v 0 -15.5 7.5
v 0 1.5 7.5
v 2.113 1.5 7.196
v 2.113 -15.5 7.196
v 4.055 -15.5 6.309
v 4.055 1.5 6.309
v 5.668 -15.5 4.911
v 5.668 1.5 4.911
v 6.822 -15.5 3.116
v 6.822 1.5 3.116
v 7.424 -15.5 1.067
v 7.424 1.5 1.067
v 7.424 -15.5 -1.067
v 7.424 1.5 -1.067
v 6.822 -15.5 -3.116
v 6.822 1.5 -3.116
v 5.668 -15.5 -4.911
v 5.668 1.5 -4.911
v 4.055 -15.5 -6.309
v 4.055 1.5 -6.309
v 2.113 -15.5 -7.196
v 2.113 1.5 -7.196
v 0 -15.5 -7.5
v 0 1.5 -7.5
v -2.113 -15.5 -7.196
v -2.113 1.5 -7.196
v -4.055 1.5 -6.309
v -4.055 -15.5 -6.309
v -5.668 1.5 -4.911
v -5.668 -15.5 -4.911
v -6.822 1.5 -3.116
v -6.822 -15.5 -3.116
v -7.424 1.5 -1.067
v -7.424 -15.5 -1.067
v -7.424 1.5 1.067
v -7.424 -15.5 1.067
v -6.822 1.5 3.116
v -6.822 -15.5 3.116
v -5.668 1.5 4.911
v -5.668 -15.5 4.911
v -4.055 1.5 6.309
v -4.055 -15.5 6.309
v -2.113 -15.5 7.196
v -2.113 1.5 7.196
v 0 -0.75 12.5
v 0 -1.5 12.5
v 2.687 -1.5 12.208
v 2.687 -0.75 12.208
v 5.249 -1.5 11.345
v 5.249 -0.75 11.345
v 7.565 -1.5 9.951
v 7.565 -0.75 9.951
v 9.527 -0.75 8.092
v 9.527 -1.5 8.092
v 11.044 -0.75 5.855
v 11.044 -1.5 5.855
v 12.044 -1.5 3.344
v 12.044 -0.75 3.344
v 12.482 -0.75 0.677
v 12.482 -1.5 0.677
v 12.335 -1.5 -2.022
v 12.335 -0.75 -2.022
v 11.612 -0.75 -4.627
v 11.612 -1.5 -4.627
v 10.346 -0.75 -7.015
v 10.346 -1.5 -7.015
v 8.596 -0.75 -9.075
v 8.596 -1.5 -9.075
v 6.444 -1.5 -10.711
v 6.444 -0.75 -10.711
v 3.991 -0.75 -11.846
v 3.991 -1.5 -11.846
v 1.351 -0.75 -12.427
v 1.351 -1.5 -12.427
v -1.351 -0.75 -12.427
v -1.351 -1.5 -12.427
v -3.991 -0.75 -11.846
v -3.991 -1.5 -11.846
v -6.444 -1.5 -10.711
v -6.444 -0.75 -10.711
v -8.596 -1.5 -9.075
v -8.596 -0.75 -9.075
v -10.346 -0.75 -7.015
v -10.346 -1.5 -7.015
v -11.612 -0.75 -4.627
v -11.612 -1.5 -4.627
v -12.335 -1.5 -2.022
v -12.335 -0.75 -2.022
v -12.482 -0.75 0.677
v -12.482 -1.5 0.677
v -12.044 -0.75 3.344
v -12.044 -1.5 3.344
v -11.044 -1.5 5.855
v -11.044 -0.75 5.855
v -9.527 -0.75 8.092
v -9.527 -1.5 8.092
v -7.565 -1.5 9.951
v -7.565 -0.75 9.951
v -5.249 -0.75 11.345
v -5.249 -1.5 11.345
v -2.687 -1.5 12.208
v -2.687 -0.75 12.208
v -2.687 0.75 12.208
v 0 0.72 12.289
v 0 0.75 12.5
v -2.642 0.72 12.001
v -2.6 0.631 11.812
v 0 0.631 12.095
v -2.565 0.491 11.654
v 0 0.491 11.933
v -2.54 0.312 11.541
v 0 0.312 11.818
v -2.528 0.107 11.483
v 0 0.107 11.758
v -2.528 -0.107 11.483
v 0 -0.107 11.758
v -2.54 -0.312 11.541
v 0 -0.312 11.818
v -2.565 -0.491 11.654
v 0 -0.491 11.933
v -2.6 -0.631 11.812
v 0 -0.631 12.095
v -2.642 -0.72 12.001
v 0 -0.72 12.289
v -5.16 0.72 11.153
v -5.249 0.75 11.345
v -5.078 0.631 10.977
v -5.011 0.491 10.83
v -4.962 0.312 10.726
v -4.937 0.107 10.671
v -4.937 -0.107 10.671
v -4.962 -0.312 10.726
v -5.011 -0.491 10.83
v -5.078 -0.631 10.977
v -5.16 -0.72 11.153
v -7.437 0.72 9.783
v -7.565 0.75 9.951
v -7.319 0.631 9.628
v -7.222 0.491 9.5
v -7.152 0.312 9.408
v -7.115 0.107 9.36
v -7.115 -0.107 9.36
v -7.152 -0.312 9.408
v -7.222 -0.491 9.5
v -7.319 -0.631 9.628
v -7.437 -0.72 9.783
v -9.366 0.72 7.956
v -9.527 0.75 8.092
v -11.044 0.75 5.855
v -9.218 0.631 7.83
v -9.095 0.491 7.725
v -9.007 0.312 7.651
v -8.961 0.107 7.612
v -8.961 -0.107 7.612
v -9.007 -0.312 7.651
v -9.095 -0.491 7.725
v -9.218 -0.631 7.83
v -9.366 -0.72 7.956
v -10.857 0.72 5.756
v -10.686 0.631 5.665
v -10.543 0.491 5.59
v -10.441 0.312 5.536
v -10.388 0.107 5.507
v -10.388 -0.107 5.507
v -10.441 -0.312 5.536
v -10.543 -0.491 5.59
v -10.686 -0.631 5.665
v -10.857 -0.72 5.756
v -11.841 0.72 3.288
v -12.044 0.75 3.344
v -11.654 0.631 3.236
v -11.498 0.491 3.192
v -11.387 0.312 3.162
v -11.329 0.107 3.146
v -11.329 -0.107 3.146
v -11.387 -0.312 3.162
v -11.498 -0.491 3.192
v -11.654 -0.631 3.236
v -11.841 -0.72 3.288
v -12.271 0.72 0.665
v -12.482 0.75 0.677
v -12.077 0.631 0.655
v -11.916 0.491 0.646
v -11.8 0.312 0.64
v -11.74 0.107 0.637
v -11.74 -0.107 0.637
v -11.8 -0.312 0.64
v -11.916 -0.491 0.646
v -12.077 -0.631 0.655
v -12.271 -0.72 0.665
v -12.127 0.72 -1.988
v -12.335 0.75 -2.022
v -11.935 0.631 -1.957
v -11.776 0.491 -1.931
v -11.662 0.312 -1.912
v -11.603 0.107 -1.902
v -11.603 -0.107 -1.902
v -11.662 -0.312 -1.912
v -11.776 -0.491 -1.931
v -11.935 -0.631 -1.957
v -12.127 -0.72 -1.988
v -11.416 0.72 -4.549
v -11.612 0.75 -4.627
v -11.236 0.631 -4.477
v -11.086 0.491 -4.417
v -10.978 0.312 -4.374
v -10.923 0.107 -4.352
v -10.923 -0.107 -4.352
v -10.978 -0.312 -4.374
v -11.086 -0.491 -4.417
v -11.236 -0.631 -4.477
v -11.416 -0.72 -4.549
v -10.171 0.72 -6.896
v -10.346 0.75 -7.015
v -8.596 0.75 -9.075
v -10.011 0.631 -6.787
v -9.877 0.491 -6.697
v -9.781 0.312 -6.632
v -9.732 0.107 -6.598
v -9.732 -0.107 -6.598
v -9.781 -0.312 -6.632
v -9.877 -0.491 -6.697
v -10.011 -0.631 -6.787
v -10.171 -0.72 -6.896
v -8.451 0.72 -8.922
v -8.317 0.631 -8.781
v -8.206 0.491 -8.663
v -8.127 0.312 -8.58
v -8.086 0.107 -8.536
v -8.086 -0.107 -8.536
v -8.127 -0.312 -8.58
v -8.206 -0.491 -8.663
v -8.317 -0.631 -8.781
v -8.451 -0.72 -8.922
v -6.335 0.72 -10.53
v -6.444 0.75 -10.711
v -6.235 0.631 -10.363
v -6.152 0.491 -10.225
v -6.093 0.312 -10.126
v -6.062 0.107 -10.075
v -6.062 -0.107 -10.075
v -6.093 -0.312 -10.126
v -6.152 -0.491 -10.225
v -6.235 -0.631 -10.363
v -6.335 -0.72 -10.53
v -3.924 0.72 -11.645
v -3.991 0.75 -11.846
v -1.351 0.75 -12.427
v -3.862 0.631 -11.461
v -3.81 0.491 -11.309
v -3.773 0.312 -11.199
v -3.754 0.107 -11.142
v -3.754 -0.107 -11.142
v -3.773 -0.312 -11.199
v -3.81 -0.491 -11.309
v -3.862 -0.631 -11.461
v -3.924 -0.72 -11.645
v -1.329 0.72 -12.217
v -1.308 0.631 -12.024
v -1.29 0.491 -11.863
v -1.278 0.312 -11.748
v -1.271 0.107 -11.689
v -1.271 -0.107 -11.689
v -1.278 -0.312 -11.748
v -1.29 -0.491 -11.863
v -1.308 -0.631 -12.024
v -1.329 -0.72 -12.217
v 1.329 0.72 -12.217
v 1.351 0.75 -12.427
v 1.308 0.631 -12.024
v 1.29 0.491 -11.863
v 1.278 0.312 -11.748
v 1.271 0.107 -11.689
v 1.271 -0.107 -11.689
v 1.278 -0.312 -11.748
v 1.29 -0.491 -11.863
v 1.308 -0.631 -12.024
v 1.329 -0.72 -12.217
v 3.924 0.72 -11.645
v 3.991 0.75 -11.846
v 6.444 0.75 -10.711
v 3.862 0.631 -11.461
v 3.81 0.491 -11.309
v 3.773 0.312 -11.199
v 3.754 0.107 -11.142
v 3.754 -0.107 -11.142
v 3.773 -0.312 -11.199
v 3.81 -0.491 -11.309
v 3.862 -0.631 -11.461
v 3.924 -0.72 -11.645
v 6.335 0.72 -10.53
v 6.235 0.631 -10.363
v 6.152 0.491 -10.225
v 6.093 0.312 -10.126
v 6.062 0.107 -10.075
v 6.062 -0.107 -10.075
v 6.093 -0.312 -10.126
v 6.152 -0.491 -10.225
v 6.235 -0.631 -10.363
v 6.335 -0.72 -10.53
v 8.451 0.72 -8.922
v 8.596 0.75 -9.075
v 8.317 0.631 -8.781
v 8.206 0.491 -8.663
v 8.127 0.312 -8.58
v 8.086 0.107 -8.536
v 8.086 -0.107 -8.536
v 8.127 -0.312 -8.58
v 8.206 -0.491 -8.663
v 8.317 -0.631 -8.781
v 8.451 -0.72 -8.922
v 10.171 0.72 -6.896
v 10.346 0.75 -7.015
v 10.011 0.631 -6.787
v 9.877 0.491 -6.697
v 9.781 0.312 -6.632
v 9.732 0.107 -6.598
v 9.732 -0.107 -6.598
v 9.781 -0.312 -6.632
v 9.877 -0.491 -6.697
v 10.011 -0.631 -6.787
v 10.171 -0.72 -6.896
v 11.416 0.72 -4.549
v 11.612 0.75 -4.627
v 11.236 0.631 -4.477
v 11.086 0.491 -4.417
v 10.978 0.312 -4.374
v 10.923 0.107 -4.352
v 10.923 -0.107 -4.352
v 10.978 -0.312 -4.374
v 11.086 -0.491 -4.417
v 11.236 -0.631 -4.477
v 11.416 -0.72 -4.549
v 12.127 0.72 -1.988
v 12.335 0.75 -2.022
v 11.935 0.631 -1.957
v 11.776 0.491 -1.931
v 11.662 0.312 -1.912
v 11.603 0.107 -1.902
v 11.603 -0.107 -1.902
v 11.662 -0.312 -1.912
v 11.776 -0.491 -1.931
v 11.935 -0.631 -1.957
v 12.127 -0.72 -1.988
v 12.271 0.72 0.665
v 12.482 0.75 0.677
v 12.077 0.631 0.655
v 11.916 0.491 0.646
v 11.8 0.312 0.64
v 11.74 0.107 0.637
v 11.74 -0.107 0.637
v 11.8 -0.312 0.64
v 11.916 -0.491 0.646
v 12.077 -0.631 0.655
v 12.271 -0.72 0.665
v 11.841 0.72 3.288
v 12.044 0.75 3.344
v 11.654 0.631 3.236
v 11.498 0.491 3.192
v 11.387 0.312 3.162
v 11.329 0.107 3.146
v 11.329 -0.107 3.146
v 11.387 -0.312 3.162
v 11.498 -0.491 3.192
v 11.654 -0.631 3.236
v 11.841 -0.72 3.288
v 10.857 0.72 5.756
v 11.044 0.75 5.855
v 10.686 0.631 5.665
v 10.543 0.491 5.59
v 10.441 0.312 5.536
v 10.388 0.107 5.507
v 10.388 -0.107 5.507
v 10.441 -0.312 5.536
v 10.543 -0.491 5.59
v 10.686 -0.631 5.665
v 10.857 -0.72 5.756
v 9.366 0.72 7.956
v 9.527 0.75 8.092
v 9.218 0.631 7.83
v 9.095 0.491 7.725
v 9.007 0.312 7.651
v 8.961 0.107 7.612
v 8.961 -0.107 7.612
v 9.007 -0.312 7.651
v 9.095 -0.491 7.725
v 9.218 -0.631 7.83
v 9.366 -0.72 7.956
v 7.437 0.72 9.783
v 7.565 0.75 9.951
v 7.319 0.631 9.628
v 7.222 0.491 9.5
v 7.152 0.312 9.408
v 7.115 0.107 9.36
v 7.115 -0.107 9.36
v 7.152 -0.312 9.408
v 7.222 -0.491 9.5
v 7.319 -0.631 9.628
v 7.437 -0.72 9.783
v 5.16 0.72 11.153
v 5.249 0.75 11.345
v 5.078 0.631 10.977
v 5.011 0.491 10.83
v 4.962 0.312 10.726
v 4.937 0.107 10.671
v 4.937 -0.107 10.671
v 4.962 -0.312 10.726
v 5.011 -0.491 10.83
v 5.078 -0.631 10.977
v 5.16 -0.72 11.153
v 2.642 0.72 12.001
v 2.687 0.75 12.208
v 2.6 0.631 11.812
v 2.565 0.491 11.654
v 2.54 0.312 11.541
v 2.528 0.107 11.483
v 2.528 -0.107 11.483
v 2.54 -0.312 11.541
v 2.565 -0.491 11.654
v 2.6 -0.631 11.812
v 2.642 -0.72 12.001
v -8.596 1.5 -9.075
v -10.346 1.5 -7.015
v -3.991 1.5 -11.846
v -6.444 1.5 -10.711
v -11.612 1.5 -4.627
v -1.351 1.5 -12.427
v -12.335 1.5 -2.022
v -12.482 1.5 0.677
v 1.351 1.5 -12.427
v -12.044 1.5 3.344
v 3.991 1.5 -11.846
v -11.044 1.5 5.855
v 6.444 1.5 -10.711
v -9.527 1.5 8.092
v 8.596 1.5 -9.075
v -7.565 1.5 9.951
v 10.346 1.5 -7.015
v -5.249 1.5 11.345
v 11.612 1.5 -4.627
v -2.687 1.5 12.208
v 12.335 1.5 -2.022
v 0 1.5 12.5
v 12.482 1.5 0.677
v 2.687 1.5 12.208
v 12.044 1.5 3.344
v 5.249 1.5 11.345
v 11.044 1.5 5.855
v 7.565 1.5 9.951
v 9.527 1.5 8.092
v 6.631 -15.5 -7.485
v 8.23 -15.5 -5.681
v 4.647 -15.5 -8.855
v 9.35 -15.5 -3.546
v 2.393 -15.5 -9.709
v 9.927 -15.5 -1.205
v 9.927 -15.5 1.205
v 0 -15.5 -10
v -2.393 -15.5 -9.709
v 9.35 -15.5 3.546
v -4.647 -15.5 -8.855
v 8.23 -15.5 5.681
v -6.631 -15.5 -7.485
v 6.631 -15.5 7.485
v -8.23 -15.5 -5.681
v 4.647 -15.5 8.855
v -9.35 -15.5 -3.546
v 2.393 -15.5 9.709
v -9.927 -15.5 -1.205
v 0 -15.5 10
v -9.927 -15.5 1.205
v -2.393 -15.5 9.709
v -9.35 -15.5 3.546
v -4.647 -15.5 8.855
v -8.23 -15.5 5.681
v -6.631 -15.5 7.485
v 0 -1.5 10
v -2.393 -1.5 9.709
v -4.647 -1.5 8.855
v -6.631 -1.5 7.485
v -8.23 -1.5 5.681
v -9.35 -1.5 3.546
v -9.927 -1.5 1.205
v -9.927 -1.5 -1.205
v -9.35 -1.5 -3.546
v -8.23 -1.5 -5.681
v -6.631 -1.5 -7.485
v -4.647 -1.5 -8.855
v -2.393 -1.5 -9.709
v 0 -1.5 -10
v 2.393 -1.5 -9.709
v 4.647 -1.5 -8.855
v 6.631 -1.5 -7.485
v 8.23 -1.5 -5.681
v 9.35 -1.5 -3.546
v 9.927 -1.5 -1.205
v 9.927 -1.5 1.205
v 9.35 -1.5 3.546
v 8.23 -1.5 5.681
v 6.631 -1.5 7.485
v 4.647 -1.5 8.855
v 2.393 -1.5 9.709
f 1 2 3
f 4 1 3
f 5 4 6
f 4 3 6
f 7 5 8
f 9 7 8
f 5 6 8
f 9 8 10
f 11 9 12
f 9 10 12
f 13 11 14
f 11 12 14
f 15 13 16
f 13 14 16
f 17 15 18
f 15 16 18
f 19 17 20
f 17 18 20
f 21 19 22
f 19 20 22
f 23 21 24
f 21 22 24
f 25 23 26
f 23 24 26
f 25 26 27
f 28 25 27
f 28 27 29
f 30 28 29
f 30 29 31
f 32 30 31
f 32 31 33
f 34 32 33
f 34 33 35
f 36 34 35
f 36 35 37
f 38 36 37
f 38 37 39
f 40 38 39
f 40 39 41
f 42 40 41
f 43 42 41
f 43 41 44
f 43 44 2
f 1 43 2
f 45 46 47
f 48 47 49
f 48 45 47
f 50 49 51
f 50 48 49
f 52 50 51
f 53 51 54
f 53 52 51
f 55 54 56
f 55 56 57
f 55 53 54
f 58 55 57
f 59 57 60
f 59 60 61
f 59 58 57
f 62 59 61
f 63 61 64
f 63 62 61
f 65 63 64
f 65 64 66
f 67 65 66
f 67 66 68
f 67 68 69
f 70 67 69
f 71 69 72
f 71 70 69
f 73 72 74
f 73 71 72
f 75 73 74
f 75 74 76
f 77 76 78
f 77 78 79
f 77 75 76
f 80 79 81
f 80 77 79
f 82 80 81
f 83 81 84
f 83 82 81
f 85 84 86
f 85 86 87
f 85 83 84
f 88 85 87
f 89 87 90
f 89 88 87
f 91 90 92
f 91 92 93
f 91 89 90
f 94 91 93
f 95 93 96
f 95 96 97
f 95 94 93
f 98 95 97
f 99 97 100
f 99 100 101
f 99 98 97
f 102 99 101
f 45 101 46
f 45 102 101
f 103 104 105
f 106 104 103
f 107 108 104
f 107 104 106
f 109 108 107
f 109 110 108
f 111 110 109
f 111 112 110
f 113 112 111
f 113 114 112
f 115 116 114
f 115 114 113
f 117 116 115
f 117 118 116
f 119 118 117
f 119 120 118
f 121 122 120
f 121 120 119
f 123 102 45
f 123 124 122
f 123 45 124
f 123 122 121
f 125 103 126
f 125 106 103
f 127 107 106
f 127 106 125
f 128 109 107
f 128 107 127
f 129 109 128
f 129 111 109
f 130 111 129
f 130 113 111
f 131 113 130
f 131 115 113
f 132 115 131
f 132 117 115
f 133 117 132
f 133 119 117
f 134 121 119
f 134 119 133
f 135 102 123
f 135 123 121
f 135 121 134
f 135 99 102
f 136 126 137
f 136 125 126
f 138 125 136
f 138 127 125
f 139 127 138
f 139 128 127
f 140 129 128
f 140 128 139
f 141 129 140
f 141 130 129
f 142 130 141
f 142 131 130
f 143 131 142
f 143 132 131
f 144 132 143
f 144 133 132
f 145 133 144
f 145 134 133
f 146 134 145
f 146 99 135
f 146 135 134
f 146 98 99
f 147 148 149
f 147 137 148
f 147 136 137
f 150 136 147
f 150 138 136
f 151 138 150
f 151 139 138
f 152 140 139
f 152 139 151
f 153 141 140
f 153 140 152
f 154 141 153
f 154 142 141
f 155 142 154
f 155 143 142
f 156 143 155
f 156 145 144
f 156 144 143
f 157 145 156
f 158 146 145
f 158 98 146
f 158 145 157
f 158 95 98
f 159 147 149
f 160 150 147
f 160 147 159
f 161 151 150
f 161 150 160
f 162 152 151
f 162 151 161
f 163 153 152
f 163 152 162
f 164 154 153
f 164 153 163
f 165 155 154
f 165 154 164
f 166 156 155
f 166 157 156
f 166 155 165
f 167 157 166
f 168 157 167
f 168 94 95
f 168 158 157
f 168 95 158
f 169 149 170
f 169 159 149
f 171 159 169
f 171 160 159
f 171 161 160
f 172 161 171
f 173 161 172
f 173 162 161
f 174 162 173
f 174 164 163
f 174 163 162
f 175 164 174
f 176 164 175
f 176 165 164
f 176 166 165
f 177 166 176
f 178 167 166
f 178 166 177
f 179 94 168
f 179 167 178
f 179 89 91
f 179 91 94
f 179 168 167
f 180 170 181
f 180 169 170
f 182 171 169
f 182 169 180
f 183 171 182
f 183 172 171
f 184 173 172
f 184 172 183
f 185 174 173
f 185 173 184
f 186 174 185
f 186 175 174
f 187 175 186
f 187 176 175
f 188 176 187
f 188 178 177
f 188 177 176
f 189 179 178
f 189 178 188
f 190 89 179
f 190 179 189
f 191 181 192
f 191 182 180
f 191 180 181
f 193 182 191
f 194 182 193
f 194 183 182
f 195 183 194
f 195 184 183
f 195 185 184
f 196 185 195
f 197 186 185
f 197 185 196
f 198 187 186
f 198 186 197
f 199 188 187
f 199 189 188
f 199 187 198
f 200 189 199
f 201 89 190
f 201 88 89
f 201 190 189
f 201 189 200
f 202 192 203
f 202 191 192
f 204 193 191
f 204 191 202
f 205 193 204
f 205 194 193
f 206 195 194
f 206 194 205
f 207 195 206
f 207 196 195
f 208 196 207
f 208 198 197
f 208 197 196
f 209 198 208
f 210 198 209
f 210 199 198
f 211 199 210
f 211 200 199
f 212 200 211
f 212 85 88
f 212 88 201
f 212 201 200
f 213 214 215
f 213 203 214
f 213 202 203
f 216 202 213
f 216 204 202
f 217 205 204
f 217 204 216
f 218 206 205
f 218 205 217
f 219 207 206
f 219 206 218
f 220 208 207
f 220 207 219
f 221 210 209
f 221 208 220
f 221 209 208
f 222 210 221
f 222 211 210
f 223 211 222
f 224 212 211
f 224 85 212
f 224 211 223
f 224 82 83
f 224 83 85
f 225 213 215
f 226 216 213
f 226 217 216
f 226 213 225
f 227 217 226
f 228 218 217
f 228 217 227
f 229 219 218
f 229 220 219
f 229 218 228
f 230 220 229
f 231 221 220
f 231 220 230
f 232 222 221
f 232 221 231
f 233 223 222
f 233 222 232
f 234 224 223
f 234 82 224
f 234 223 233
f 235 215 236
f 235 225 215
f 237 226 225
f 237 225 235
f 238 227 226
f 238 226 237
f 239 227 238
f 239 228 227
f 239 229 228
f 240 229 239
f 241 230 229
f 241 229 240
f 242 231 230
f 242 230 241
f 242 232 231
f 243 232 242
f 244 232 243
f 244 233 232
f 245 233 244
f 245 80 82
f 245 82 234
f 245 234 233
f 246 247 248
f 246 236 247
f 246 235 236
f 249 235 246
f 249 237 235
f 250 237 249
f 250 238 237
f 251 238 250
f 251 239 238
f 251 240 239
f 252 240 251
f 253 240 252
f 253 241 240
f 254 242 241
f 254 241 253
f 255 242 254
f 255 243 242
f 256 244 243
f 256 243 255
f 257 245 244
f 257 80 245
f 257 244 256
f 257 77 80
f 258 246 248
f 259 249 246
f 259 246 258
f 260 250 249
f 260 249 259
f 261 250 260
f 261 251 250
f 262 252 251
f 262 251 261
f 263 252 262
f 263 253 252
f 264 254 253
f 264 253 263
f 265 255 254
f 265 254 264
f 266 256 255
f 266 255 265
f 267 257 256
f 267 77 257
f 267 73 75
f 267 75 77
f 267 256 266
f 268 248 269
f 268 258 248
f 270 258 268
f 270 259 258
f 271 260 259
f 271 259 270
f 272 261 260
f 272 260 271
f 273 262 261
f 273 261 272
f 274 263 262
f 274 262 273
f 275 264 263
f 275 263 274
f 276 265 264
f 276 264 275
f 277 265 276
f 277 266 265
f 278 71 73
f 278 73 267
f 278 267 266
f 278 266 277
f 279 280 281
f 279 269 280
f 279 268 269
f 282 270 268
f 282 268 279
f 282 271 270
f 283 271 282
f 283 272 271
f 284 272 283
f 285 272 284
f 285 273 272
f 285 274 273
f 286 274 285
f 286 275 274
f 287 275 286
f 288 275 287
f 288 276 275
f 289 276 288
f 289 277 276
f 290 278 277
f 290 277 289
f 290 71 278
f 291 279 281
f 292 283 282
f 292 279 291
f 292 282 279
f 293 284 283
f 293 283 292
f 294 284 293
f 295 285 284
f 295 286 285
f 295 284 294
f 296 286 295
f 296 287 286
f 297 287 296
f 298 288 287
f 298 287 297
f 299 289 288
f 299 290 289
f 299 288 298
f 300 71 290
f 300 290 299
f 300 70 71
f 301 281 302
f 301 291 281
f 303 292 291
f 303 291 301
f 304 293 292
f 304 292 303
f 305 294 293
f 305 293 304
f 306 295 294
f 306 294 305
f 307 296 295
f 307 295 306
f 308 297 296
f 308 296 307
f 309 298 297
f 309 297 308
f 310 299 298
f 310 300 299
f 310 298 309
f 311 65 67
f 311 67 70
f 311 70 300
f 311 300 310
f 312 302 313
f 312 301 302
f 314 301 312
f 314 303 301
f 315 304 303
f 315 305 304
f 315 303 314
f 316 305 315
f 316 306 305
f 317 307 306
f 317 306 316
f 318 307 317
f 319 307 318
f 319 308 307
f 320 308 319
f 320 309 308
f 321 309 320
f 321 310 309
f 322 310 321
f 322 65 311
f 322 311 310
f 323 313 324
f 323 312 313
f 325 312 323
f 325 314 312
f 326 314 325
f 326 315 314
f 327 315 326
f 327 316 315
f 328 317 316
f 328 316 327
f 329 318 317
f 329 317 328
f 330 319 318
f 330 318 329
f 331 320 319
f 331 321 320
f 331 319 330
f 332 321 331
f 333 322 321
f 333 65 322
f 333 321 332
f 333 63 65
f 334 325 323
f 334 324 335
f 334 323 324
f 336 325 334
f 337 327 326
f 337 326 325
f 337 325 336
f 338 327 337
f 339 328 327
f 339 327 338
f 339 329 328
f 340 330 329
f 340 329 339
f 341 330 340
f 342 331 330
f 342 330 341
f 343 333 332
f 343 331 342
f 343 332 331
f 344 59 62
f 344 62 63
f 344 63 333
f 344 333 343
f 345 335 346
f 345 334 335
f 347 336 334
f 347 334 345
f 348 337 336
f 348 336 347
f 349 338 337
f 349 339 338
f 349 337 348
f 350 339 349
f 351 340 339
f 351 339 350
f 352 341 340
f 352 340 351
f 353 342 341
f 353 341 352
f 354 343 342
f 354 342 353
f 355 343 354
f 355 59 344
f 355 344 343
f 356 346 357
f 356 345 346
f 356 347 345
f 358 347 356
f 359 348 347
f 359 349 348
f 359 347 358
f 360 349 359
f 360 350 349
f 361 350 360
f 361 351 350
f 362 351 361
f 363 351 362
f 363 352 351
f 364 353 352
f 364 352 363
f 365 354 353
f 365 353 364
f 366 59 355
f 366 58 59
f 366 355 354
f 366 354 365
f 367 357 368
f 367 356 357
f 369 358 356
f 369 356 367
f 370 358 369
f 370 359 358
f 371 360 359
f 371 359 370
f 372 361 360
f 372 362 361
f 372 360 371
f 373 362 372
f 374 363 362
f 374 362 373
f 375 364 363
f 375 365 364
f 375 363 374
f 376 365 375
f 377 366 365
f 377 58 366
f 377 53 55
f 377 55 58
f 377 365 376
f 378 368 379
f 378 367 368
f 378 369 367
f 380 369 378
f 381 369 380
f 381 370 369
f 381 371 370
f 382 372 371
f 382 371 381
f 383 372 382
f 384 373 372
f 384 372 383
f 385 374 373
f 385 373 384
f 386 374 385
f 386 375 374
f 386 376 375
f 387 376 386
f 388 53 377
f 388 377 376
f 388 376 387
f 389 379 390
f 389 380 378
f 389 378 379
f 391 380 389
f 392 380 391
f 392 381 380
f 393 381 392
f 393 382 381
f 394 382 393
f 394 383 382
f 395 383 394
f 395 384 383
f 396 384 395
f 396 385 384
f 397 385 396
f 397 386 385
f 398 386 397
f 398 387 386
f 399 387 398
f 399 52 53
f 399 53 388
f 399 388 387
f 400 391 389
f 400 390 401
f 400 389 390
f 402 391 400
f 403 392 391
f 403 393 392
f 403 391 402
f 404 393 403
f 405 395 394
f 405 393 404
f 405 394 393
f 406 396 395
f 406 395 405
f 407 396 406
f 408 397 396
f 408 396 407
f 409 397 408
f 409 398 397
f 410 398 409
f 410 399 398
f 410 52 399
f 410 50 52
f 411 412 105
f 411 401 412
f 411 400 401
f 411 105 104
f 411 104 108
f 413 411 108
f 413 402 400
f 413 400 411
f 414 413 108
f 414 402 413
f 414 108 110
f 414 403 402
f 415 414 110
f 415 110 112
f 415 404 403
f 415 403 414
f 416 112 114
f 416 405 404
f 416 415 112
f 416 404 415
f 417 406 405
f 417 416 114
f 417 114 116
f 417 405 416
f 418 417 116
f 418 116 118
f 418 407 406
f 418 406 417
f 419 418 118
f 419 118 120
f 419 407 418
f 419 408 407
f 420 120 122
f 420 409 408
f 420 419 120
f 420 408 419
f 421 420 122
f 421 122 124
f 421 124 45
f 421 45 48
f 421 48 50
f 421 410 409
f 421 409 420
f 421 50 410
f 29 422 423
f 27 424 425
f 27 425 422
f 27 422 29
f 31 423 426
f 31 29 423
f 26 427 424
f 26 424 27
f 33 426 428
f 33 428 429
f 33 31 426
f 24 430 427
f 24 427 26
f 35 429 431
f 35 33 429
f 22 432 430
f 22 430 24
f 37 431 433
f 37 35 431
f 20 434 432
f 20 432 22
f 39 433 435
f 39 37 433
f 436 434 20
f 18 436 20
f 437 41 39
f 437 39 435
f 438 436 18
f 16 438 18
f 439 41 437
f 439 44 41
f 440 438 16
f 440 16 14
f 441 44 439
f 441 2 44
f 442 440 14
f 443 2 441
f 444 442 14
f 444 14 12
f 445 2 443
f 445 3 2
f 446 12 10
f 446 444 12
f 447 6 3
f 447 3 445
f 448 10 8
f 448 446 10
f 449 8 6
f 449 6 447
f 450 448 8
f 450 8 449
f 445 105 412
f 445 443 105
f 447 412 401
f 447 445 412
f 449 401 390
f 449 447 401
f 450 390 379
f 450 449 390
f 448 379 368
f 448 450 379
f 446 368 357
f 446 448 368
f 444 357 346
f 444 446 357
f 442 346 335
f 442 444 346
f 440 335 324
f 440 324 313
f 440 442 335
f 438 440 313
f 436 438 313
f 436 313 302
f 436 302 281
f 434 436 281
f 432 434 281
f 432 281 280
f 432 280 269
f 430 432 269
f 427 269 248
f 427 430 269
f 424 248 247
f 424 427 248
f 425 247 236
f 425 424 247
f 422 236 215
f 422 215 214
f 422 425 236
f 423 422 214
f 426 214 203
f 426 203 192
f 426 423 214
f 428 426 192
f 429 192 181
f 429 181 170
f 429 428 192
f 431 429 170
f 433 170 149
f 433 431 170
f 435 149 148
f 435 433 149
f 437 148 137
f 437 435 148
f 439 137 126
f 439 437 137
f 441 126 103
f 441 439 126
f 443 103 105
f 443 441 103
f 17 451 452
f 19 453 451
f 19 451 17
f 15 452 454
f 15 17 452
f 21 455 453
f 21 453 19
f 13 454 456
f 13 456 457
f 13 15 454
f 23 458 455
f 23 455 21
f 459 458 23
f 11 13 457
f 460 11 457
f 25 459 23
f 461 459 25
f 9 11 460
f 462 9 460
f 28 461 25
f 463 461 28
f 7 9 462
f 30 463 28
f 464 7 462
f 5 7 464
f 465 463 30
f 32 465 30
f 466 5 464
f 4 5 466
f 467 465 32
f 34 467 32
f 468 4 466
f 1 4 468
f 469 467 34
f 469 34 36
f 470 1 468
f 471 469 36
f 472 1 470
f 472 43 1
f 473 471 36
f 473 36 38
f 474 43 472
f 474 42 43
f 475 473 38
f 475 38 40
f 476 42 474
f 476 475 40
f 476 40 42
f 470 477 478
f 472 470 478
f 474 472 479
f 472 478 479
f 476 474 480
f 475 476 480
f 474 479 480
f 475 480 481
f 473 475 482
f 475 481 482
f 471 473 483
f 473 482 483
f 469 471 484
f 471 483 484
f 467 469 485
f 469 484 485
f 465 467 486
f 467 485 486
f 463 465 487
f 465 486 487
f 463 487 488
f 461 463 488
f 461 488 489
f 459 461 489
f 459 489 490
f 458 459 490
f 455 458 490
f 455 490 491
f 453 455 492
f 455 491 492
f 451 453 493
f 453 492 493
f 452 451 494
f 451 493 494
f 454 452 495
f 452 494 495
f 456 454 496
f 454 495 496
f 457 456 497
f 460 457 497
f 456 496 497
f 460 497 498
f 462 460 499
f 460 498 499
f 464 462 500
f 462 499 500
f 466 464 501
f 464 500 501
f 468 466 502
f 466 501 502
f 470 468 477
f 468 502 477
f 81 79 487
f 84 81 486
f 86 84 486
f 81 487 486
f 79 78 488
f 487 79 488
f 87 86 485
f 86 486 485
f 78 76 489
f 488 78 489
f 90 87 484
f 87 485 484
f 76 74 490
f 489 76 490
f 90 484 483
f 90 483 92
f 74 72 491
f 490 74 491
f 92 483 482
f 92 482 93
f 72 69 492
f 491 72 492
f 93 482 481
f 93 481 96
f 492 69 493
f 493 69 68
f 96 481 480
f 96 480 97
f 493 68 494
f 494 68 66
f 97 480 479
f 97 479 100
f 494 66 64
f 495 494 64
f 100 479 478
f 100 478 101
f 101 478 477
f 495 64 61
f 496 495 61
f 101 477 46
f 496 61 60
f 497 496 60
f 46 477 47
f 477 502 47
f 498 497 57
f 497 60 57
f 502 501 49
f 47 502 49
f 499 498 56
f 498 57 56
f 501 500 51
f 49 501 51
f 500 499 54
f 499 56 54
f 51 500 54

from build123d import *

# Parameters (mm, degrees)
CROQUIS1_R              = 12.5
SALIENTE_EXTRUIR1_DEPTH = 1.5
CROQUIS2_R              = 0.75
CROQUIS4_R              = 10
SALIENTE_EXTRUIR2_DEPTH = 14
CROQUIS3_R              = 7.5
CORTAR_EXTRUIR1_DEPTH   = 25.525496937


with BuildPart() as part:
    # Croquis1 → Saliente-Extruir1 (new, symmetric)
    with BuildSketch(Plane(origin=(0, 0, 0), x_dir=(1, 0, 0), z_dir=(0, 1, 0))):
        with Locations(Location((0, 0, 0), (0, 0, 270))):
            Circle(CROQUIS1_R)
    extrude(amount=SALIENTE_EXTRUIR1_DEPTH, both=True)

    # Croquis2 → Cortar-Revolución1 (revolve, cut)
    with BuildSketch(Plane(origin=(0, 0, 0), x_dir=(0, 0, -1), z_dir=(1, 0, 0)), mode=Mode.PRIVATE) as cortar_revoluci_n1_sk:
        with Locations((12.5, 0)):
            Circle(CROQUIS2_R)
    revolve(cortar_revoluci_n1_sk.sketch.rotate(Axis((0, 1.5, 0), (0, -1, 0)), 180), axis=Axis((0, 1.5, 0), (0, -1, 0)), mode=Mode.SUBTRACT)

    # Croquis4 → Saliente-Extruir2 (add)
    with BuildSketch(Plane.XZ.offset(1.5)):
        with Locations(Location((0, 0, 0), (0, 0, 90))):
            Circle(CROQUIS4_R)
    extrude(amount=SALIENTE_EXTRUIR2_DEPTH)

    # Croquis3 → Cortar-Extruir1 (cut, through all)
    with BuildSketch(Plane(origin=(0, 1.5, 0), x_dir=(1, 0, 0), z_dir=(0, 1, 0))):
        with Locations(Location((0, 0, 0), (0, 0, 270))):
            Circle(CROQUIS3_R)
    extrude(amount=-CORTAR_EXTRUIR1_DEPTH, mode=Mode.SUBTRACT)


solid = part.part
